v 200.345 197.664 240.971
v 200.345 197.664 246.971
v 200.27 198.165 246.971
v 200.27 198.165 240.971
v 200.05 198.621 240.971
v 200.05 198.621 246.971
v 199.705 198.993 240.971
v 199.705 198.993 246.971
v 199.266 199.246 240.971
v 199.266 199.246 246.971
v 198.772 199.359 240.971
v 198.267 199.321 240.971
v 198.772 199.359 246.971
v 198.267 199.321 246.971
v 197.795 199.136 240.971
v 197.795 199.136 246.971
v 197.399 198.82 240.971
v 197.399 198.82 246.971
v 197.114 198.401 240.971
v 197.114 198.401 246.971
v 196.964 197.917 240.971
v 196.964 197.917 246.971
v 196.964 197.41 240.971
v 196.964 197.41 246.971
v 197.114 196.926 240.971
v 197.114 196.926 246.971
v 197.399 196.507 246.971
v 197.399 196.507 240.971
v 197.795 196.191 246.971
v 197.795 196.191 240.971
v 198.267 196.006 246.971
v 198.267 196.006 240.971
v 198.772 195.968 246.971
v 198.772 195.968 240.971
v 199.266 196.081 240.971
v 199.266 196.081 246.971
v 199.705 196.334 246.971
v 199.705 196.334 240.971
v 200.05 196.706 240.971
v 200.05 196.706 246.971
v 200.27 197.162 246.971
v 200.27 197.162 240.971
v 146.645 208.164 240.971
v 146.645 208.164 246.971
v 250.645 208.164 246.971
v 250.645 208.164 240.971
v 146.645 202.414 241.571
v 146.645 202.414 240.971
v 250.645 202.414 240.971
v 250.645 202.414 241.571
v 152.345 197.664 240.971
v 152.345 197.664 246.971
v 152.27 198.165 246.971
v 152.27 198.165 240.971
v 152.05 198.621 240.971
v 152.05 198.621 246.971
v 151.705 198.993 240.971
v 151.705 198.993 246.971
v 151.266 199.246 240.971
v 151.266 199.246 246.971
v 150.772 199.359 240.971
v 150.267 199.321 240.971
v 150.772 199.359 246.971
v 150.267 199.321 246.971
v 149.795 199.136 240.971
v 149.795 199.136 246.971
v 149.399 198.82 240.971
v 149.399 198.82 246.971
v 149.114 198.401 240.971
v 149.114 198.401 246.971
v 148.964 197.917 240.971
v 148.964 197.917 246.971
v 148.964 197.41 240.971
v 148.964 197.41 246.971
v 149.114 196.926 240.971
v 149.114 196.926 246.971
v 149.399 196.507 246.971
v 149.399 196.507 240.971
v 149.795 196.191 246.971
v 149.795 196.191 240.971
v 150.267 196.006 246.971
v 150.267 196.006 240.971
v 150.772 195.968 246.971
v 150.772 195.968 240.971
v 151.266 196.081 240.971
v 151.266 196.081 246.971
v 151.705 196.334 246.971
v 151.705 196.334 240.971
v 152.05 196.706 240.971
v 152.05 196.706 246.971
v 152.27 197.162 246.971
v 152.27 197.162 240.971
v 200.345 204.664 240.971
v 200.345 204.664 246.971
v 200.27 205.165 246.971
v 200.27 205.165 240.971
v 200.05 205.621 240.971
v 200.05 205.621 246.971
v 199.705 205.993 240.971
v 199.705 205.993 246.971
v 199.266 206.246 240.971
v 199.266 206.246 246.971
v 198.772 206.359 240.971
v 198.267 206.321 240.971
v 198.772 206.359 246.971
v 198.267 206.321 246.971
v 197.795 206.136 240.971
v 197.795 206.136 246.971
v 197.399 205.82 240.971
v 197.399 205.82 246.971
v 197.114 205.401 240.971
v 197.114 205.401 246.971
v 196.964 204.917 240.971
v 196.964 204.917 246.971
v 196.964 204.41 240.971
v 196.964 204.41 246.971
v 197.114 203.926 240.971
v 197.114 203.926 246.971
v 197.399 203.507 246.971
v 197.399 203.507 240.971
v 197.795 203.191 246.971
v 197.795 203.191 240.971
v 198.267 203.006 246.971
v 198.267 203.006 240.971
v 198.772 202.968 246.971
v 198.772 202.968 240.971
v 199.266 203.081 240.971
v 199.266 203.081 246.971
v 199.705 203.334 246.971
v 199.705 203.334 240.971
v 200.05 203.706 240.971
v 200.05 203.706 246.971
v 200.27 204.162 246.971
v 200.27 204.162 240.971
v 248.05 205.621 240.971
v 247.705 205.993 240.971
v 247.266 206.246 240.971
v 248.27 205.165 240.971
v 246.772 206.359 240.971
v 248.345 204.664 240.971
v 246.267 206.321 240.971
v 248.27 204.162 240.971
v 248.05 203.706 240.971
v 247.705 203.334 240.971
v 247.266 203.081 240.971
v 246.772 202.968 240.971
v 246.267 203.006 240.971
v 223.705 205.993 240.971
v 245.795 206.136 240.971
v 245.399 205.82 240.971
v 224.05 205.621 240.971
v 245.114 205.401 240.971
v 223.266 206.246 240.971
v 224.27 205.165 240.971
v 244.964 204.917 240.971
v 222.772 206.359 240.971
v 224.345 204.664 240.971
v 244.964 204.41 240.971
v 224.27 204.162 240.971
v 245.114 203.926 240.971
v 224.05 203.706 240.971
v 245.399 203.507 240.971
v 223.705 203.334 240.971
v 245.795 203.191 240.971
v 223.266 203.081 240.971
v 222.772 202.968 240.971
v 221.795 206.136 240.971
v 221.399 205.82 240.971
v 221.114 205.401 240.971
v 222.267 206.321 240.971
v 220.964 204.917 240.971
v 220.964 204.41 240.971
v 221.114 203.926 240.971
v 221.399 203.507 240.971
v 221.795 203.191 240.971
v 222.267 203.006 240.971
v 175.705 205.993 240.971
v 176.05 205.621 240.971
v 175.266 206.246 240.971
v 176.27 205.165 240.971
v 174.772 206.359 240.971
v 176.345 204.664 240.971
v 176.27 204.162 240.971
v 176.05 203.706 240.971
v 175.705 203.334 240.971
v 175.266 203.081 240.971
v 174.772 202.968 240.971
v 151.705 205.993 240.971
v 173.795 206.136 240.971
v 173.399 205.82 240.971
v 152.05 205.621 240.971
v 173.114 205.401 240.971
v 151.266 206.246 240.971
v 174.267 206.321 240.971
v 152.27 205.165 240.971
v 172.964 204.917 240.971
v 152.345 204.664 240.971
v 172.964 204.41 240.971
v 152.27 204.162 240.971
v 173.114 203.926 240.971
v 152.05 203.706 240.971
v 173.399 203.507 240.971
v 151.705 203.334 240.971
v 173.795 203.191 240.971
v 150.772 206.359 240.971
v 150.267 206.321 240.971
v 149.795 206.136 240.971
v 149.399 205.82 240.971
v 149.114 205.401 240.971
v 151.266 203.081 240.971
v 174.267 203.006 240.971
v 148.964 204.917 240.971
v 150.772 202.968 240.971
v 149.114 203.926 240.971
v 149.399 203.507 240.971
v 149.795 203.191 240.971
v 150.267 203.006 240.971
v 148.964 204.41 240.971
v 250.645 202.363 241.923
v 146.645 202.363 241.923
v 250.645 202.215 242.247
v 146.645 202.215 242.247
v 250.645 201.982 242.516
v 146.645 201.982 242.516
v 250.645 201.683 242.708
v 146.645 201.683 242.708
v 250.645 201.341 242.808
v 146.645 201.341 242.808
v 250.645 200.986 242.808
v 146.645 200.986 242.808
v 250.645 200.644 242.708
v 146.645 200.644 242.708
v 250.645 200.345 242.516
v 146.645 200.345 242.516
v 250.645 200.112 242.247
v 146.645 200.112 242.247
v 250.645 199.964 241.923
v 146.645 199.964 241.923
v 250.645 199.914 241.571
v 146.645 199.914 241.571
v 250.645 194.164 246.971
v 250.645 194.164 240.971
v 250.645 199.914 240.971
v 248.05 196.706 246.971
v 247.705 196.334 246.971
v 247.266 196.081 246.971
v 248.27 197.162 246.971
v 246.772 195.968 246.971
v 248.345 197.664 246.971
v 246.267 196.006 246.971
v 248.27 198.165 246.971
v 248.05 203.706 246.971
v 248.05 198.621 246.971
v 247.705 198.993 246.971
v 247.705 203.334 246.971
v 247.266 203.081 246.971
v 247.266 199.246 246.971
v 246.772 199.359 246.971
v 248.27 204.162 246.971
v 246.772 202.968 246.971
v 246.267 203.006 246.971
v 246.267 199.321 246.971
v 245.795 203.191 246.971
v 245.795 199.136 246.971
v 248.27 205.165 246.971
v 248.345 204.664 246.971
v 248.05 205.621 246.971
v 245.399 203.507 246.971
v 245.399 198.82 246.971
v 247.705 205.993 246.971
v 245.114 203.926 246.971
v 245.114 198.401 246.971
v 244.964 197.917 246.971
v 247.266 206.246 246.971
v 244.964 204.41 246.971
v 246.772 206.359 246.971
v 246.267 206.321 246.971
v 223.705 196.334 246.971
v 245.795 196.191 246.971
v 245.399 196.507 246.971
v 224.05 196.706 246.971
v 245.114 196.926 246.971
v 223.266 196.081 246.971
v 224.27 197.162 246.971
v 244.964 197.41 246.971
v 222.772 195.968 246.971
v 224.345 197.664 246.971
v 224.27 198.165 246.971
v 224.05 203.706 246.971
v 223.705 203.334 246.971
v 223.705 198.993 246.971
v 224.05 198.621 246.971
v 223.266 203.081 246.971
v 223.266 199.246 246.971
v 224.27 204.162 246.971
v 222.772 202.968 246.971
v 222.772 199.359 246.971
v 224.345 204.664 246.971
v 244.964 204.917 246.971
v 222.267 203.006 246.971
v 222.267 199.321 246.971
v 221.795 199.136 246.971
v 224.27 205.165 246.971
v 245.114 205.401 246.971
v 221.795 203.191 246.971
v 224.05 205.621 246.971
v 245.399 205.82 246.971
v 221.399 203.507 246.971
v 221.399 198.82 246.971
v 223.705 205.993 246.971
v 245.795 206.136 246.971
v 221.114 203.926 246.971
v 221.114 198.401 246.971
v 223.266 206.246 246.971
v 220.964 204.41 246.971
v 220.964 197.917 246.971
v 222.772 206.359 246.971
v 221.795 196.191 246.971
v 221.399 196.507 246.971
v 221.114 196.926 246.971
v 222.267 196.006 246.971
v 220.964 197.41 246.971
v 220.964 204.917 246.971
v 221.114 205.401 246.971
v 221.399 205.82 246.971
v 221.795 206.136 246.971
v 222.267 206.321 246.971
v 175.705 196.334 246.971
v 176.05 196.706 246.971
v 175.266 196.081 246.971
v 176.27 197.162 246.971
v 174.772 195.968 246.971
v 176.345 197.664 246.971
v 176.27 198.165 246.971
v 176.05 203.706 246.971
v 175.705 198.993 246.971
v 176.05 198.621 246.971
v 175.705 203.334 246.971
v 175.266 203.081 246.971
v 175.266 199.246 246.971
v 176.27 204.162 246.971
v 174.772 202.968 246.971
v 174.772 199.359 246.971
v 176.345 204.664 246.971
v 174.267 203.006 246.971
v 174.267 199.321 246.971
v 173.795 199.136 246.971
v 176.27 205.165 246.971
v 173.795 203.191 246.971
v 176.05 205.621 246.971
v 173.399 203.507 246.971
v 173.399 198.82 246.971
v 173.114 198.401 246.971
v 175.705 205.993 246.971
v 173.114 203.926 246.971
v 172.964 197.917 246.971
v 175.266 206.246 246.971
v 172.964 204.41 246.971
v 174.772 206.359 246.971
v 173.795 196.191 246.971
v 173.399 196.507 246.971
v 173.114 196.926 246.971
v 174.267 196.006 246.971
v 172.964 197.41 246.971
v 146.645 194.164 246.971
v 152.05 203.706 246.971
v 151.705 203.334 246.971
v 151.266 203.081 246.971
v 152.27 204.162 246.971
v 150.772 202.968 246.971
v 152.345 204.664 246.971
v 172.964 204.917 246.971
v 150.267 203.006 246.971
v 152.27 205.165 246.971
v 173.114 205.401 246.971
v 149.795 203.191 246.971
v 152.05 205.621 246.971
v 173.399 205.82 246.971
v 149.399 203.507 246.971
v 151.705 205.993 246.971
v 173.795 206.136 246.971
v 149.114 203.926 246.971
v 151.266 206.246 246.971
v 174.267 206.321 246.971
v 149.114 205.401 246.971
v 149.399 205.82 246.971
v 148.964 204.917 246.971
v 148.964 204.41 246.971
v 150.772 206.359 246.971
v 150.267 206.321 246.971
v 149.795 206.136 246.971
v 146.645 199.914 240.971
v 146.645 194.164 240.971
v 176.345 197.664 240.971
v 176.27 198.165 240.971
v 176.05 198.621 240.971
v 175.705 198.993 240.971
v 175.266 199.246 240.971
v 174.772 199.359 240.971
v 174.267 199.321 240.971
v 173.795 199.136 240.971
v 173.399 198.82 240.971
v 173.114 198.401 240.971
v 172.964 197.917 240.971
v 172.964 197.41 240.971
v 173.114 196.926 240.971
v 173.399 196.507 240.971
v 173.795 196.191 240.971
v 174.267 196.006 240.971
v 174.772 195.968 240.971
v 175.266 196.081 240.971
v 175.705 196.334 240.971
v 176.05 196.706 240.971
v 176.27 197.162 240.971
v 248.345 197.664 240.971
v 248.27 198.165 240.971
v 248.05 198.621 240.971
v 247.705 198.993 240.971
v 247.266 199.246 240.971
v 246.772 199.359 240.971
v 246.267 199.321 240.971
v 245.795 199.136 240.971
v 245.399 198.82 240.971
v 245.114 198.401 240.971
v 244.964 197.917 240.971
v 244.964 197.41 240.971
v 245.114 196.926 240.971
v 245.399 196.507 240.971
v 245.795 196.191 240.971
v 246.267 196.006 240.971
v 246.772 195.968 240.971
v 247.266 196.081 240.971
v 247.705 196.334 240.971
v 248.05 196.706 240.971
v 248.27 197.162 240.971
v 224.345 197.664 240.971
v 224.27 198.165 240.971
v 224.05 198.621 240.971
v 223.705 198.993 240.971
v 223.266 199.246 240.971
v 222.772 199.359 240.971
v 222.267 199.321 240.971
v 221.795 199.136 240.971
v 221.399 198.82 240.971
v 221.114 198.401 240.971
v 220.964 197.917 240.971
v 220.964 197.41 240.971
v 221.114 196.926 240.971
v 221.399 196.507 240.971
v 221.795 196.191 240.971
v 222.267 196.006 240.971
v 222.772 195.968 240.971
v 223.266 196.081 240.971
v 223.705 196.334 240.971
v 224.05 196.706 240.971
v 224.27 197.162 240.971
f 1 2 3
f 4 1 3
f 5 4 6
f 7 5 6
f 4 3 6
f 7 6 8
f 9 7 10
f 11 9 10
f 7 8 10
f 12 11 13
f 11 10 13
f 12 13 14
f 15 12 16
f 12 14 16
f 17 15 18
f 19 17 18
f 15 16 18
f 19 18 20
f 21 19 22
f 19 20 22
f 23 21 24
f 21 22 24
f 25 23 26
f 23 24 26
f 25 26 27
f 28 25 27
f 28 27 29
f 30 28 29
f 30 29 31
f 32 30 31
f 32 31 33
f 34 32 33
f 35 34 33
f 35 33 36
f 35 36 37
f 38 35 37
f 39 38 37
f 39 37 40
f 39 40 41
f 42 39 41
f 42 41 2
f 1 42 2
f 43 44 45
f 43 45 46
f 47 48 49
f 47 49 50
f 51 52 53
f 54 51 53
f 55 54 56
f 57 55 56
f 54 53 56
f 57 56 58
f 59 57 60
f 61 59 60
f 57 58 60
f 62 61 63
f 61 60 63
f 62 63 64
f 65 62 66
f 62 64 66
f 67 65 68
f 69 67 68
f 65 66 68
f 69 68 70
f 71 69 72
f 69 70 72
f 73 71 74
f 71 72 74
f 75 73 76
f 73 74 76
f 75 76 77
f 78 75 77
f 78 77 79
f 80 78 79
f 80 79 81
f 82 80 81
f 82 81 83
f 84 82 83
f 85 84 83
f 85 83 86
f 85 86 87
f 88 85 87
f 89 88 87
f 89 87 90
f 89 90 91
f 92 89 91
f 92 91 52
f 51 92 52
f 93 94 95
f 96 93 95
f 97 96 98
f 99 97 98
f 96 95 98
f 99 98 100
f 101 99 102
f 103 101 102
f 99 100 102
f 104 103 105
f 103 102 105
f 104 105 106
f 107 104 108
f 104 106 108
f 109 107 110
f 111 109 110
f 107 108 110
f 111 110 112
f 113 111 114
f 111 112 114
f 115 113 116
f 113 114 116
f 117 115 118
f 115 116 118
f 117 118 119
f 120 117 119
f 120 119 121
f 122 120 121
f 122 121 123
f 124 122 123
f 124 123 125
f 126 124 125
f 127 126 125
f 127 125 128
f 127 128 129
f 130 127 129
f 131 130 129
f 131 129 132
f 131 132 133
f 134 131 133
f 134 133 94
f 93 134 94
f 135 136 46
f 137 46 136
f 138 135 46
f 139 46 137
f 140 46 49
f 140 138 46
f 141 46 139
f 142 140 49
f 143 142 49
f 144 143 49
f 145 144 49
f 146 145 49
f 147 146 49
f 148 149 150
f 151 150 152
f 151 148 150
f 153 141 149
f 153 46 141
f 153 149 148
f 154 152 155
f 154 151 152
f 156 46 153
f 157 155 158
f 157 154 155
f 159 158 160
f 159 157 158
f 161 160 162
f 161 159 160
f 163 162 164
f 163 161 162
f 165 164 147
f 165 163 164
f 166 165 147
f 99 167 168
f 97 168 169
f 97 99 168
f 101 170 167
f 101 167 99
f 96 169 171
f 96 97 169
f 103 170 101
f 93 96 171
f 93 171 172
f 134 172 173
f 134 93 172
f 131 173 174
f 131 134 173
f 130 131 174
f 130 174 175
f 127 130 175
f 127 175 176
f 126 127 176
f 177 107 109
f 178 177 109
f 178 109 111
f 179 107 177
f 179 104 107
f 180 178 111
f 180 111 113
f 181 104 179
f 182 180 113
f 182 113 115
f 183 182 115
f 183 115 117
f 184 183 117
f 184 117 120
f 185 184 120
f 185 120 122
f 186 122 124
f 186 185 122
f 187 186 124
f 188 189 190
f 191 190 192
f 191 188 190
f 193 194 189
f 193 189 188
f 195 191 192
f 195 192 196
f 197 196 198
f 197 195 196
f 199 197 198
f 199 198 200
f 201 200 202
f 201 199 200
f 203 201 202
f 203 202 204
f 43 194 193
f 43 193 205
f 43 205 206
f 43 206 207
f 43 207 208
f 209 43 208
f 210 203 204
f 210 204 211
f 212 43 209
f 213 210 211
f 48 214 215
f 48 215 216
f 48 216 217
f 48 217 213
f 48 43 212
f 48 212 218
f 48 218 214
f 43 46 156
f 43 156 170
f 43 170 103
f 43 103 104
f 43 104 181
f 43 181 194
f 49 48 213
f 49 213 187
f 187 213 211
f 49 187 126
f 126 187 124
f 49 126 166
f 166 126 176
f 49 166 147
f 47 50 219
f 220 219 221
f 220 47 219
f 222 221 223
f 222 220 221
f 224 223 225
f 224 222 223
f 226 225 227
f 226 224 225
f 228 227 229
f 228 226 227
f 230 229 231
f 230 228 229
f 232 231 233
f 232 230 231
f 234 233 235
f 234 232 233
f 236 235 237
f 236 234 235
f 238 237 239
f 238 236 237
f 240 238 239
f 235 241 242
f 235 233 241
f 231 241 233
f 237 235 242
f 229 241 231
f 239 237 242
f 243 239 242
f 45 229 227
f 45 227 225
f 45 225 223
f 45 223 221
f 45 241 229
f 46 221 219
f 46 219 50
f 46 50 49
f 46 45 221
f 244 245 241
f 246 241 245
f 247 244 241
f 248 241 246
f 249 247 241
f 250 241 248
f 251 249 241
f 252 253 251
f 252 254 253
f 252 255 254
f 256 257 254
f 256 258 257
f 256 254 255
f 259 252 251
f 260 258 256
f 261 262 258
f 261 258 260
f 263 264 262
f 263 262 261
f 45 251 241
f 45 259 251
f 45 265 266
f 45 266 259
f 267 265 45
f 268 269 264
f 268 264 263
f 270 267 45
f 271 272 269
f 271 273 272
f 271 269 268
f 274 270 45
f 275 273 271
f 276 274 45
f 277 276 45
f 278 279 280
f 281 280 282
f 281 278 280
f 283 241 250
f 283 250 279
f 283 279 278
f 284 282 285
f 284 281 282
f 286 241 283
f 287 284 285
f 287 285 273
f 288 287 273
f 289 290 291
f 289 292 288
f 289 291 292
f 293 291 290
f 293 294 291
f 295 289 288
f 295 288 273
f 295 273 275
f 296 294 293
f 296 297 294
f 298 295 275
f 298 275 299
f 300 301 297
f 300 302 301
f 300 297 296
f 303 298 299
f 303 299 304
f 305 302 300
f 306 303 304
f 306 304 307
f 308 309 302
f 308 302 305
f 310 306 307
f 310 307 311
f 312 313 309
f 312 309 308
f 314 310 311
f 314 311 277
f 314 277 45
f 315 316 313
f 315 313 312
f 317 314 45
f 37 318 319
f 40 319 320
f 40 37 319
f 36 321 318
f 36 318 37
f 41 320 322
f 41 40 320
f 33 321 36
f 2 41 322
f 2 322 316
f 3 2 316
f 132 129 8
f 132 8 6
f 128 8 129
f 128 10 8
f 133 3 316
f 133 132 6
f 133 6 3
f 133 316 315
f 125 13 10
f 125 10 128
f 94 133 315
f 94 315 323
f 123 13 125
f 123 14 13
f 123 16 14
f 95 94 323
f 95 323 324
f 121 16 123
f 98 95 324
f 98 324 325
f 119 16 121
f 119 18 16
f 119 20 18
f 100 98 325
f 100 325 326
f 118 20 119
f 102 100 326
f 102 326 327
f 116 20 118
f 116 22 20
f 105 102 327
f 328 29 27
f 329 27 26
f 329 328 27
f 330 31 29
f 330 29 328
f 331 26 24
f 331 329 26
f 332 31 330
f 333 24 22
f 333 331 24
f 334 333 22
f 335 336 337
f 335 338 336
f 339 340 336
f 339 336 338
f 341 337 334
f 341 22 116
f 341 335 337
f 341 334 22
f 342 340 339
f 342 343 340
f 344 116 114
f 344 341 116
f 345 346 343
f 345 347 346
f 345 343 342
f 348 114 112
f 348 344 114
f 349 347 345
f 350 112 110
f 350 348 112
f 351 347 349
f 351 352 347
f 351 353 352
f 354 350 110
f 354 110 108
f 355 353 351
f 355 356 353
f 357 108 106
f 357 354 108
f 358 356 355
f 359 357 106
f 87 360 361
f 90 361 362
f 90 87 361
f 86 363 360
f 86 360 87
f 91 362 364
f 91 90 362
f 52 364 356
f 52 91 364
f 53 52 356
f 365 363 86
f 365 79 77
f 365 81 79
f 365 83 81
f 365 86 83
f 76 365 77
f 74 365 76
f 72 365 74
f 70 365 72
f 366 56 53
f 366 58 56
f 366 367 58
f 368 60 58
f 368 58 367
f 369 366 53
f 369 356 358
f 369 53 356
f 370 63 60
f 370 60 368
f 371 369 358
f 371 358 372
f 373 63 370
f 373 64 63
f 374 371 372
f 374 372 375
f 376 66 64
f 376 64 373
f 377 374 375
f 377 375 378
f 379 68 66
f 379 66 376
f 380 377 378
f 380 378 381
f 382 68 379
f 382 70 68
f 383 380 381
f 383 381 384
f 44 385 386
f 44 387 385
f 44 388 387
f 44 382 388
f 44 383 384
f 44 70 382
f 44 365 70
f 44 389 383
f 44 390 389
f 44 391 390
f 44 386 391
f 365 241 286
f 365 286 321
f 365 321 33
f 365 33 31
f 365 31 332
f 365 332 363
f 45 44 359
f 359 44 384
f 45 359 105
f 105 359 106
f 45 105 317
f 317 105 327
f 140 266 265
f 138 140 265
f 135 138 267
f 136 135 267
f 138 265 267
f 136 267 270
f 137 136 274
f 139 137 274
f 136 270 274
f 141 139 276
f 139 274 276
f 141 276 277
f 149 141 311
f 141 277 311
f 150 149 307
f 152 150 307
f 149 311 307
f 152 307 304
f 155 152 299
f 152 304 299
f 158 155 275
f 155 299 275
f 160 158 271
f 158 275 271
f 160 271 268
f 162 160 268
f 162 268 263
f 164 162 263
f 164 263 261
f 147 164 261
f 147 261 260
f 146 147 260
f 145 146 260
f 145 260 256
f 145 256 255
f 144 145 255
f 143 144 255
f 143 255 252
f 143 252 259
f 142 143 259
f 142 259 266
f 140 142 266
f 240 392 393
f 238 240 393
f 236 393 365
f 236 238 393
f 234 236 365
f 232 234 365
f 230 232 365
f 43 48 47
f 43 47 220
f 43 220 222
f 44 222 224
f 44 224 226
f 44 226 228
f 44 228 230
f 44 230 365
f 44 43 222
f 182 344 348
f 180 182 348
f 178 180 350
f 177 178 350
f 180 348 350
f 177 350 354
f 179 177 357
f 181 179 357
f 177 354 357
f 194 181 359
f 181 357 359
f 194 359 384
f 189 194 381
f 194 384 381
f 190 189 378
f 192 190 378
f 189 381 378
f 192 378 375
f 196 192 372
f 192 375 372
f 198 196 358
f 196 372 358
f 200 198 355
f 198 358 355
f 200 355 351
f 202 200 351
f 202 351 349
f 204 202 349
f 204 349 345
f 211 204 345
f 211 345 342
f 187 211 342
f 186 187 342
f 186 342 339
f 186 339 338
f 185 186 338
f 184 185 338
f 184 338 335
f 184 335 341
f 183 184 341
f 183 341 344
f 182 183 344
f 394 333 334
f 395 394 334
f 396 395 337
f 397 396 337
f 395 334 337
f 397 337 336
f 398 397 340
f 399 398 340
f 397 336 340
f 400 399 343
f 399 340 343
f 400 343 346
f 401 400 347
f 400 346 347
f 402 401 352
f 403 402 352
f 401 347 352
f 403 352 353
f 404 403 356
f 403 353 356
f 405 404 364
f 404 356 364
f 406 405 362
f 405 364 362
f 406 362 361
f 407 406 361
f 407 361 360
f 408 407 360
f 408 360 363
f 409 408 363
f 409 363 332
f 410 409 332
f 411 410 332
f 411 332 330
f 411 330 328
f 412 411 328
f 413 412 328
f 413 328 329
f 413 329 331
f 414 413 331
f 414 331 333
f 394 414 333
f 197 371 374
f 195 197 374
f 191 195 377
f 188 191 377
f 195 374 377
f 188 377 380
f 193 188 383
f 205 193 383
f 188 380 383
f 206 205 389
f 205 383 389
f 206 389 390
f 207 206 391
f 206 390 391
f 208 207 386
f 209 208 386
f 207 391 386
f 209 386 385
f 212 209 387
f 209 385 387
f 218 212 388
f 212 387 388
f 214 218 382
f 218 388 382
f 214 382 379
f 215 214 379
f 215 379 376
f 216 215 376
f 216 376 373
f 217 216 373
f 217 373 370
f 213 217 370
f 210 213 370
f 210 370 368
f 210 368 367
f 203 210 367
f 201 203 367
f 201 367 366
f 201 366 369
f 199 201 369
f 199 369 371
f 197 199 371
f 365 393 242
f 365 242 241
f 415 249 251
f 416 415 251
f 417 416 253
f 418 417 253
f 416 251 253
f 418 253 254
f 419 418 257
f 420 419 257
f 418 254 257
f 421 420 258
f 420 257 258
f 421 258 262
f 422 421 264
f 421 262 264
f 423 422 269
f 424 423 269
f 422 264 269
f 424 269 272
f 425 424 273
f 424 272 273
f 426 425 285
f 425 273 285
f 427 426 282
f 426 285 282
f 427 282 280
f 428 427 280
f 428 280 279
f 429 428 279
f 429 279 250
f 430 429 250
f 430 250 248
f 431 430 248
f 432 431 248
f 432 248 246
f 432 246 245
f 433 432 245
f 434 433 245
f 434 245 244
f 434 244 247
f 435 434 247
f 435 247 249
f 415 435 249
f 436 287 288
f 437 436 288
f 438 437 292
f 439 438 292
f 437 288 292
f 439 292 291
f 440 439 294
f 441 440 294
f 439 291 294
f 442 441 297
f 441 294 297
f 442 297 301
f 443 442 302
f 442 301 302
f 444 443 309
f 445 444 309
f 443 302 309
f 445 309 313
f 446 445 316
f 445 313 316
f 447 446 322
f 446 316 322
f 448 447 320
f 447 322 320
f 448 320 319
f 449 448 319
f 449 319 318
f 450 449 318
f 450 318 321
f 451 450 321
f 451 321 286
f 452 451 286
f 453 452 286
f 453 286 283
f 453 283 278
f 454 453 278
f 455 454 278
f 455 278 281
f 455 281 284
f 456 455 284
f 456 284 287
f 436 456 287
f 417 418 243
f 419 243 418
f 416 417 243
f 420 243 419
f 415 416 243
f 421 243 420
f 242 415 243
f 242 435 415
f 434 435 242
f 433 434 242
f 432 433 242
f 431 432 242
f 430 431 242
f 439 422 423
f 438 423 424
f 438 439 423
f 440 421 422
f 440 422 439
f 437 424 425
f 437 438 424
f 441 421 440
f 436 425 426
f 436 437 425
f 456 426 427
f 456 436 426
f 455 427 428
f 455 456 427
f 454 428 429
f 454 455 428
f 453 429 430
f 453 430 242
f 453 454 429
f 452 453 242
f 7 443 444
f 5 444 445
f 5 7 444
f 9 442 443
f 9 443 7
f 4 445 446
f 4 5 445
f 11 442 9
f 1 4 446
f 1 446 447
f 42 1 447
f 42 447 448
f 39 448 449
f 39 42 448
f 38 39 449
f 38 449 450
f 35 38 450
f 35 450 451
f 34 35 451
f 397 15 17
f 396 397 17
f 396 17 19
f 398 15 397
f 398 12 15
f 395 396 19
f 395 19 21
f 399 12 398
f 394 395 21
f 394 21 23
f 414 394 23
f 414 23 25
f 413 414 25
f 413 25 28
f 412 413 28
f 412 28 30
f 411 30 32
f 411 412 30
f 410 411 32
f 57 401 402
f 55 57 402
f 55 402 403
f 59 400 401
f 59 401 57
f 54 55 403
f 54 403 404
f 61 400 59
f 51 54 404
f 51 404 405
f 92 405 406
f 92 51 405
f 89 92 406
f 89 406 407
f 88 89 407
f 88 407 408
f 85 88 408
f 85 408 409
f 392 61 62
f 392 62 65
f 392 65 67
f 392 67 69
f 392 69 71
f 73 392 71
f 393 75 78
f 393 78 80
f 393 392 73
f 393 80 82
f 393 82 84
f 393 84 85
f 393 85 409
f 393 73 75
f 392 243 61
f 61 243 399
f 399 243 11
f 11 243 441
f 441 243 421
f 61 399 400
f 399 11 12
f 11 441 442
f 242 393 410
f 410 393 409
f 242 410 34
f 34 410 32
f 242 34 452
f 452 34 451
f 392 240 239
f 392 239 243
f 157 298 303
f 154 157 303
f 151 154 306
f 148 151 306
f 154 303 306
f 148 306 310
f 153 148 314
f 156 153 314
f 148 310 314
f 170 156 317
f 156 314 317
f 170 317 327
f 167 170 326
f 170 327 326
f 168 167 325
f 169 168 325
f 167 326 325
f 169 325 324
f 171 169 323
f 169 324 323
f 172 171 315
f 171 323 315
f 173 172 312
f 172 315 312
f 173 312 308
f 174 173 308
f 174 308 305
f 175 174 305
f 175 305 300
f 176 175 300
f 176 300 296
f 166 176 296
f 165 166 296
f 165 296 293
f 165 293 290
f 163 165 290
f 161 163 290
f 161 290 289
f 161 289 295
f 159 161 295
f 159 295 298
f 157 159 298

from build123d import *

# Parameters (mm, degrees)
BOSS_EXTRUDE1_DEPTH      = 60
BOSS_EXTRUDE1_DEPTH_BACK = 20
SKETCH2_R                = 1.7
CUT_EXTRUDE1_DEPTH       = 10
BOSS_EXTRUDE2_START      = 24
BOSS_EXTRUDE2_DEPTH      = 24
SKETCH4_R                = 1.7
CUT_EXTRUDE2_DEPTH       = 24


with BuildPart() as part:
    # Sketch1 → Boss-Extrude1 (new, two sides: drawn at the far end of the back side and taken through both)
    with BuildSketch(Plane(origin=(190.645148, 0, 0), x_dir=(0, 0, -1), z_dir=(1, 0, 0)).offset(-BOSS_EXTRUDE1_DEPTH_BACK)):
        with BuildLine():
            Line((-246.970904961, 208.163538159), (-246.970904961, 205.163538159))
            Line((-246.970904961, 205.163538159), (-246.970904961, 197.163538159))
            Line((-246.970904961, 197.163538159), (-246.970904961, 194.163538159))
            Line((-246.970904961, 194.163538159), (-240.970904961, 194.163538159))
            Line((-240.970904961, 194.163538159), (-240.970904961, 197.163538159))
            Line((-240.970904961, 197.163538159), (-240.970904961, 199.913538158))
            Line((-240.970904961, 199.913538158), (-241.570904961, 199.913538158))
            ThreePointArc((-241.570904961, 199.913538158), (-242.820904961, 201.163538162), (-241.570904955, 202.413538158))
            Line((-241.570904955, 202.413538158), (-240.970904961, 202.413538158))
            Line((-240.970904961, 202.413538158), (-240.970904961, 205.163538159))
            Line((-240.970904961, 205.163538159), (-240.970904961, 208.163538159))
            Line((-240.970904961, 208.163538159), (-246.970904961, 208.163538159))
        make_face()
    extrude(amount=BOSS_EXTRUDE1_DEPTH + BOSS_EXTRUDE1_DEPTH_BACK)

    # Sketch2 → Cut-Extrude1 (cut)
    with BuildSketch(Plane.XY.offset(246.970904961)):
        with Locations((246.645148, 197.663538159)):
            Circle(SKETCH2_R)
        with Locations((198.645148, 197.663538159)):
            Circle(SKETCH2_R)
        with Locations((174.645148, 197.663538159)):
            Circle(SKETCH2_R)
        with Locations((222.645148, 197.663538159)):
            Circle(SKETCH2_R)
        with Locations((174.645148, 204.663538159)):
            Circle(SKETCH2_R)
        with Locations((198.645148, 204.663538159)):
            Circle(SKETCH2_R)
        with Locations((222.645148, 204.663538159)):
            Circle(SKETCH2_R)
        with Locations((246.645148, 204.663538159)):
            Circle(SKETCH2_R)
    extrude(amount=-CUT_EXTRUDE1_DEPTH, mode=Mode.SUBTRACT)

    # Sketch3 → Boss-Extrude2 (add)
    with BuildSketch(Plane.ZY.offset(-170.645148).offset(BOSS_EXTRUDE2_START)):
        with BuildLine():
            Line((246.970904961, 208.163538159), (240.970904961, 208.163538159))
            Line((240.970904961, 208.163538159), (240.970904961, 202.413538158))
            Line((240.970904961, 202.413538158), (241.570904955, 202.413538158))
            ThreePointArc((241.570904955, 202.413538158), (242.820904961, 201.163538162), (241.570904961, 199.913538158))
            Line((241.570904961, 199.913538158), (240.970904961, 199.913538158))
            Line((240.970904961, 199.913538158), (240.970904961, 194.163538159))
            Line((240.970904961, 194.163538159), (246.970904961, 194.163538159))
            Line((246.970904961, 194.163538159), (246.970904961, 208.163538159))
        make_face()
    extrude(amount=-BOSS_EXTRUDE2_DEPTH)

    # Sketch4 → Cut-Extrude2 (cut)
    with BuildSketch(Plane.XY.offset(246.970904961)):
        with Locations((150.645148, 197.663538159)):
            Circle(SKETCH4_R)
        with Locations((150.645148, 204.663538159)):
            Circle(SKETCH4_R)
    extrude(amount=-CUT_EXTRUDE2_DEPTH, mode=Mode.SUBTRACT)


solid = part.part
